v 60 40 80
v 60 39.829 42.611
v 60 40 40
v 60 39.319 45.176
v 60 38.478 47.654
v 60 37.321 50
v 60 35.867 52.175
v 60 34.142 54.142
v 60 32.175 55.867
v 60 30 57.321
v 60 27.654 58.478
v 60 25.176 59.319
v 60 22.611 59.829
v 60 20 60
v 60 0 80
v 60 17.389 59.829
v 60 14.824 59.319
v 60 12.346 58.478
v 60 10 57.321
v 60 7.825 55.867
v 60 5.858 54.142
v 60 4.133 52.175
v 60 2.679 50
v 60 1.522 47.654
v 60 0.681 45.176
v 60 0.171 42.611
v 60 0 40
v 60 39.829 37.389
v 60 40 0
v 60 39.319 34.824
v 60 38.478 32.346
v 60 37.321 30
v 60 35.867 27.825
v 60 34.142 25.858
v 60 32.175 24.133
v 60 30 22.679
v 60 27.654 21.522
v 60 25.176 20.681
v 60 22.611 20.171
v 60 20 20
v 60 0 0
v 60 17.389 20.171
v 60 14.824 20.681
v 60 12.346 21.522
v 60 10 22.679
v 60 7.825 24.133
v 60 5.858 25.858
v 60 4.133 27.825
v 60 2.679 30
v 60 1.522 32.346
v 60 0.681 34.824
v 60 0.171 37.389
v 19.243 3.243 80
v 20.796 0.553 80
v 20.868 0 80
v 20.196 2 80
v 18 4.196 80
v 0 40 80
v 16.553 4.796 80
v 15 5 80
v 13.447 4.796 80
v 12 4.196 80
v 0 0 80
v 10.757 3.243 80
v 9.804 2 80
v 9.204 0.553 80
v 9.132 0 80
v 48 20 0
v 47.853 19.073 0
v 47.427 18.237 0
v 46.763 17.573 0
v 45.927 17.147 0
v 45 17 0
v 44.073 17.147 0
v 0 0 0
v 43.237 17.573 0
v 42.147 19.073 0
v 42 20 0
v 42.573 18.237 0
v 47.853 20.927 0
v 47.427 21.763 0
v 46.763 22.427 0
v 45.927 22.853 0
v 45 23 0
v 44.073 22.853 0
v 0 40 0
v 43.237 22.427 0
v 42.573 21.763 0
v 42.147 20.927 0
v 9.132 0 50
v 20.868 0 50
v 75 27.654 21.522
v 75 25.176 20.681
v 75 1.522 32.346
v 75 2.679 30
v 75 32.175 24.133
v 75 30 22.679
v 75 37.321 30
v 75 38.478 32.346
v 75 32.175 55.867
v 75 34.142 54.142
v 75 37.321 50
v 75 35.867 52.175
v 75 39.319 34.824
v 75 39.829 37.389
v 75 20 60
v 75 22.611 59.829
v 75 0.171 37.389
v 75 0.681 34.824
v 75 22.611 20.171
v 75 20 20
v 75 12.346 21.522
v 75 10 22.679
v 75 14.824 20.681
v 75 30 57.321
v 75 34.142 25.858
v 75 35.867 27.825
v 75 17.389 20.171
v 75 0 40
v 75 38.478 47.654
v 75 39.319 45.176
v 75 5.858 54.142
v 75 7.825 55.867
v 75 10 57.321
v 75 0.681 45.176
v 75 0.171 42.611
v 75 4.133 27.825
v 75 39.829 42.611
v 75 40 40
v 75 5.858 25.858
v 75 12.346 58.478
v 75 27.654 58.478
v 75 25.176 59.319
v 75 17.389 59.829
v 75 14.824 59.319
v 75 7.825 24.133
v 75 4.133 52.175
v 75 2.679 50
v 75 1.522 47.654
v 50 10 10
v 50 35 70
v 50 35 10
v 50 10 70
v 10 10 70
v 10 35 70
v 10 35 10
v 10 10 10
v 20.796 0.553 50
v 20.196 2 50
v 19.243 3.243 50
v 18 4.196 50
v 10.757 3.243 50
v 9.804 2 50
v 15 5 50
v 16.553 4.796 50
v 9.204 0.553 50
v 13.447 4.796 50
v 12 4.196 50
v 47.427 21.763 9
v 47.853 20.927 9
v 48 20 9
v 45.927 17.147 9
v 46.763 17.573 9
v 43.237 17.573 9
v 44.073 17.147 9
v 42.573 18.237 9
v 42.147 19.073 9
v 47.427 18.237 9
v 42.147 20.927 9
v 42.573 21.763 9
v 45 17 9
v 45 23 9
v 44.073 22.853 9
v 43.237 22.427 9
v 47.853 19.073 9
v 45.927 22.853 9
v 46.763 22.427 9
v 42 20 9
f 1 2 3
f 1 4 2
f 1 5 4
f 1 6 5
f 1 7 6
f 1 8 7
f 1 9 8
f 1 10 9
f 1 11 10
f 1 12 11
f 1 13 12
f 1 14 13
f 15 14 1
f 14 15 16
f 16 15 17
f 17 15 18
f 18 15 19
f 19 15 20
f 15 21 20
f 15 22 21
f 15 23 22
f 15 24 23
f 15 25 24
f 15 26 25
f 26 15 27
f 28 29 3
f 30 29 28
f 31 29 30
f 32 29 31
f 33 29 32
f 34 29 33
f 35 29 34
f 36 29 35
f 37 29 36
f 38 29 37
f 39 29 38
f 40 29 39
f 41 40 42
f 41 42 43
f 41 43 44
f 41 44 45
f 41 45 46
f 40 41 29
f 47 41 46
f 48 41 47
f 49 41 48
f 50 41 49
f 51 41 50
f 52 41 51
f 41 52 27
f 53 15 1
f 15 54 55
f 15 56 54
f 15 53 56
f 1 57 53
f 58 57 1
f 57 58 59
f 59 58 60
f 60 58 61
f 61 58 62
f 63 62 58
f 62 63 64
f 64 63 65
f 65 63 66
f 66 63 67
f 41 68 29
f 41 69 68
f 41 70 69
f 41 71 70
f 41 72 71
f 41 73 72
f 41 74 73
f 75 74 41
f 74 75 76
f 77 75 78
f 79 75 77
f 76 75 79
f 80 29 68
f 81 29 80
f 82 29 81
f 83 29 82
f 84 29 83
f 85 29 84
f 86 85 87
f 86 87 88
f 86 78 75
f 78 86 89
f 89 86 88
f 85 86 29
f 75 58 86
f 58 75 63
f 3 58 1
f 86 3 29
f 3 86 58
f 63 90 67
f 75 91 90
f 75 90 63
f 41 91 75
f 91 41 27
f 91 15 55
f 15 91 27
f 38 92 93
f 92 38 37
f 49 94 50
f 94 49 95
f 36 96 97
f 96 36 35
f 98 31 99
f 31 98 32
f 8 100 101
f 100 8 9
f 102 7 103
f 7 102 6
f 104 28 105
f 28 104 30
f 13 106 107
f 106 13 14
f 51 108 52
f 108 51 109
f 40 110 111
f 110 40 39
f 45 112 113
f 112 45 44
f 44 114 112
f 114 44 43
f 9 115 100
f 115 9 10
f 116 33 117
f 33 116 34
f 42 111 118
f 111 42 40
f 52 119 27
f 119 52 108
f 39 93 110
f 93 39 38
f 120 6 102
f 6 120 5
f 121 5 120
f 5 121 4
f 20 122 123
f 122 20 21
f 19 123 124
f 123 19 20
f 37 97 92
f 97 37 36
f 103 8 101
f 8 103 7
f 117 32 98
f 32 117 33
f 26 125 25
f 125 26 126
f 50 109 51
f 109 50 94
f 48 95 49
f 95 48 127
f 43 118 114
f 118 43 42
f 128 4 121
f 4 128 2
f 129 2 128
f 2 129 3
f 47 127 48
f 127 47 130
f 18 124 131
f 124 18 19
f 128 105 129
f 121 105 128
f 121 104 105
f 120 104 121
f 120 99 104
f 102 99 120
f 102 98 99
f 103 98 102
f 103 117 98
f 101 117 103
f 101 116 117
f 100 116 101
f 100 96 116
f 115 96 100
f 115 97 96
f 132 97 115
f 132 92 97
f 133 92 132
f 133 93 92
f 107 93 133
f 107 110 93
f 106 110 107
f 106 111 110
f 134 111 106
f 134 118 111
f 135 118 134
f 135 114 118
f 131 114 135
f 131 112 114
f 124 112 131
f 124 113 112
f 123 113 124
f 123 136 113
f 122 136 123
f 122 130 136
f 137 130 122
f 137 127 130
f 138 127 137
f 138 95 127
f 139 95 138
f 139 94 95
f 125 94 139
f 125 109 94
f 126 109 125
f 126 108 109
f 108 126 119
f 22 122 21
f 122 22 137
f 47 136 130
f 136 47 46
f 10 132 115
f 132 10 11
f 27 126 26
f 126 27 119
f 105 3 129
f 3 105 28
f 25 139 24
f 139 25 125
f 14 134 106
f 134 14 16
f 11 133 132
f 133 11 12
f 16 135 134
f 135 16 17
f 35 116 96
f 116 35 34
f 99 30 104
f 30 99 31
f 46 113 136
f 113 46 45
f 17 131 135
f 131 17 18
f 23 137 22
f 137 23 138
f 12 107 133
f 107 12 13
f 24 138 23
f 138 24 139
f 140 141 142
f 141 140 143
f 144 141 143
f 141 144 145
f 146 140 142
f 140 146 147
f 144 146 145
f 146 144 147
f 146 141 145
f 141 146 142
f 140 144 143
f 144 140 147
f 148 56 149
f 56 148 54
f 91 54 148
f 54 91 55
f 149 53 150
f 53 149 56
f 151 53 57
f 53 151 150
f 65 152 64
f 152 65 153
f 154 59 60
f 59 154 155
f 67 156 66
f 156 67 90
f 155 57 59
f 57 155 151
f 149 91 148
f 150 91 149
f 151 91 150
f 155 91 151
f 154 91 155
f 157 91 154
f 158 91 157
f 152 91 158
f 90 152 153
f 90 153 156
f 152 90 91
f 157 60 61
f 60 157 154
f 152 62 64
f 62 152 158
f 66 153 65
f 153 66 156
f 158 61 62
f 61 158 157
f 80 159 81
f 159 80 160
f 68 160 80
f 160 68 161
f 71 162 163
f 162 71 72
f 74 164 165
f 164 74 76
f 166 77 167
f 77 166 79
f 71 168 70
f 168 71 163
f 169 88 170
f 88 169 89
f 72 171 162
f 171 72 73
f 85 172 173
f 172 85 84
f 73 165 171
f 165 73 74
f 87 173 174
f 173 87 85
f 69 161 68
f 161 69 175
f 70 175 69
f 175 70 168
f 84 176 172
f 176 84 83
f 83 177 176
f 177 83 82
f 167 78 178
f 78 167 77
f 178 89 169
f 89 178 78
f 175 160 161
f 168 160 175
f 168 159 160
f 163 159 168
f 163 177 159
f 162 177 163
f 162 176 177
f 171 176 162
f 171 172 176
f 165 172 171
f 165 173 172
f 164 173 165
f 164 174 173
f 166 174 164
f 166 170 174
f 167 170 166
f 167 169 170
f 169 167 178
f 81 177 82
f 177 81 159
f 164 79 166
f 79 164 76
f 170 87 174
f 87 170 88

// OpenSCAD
// file: lib/generated_constants.scad
// AUTO-GENERATED from simulation/sizing.py — do not hand edit
P_target_W = 10.0;
A_mem_m2 = 0.72;
active_w = 200.0;
active_h = 300.0;
n_plates = 12;
housing_od = 280.0;
housing_len = 264;
bolt_circle = 240.0;
frame_L = 664;
frame_W = 480.0;
frame_H = 900;
delta_P_bar = 34.58;
plate_pitch = 12;
// main file
// CHORUS-SGH-1 — DAQ / conductivity sensor bracket
include <lib/generated_constants.scad>

module sensor_bracket() {
  difference() {
    union() {
      cube([60, 40, 80]);
      translate([60, 20, 40])
        rotate([0, 90, 0])
          cylinder(h=30, d=40, center=true, $fn=48);
    }
    translate([10, 10, 10])
      cube([40, 25, 60]);
    translate([15, -1, 50])
      cylinder(h=42, d=12, $fn=24);
    translate([45, 20, -1])
      cylinder(h=10, d=6, $fn=20);
  }
}

sensor_bracket();
